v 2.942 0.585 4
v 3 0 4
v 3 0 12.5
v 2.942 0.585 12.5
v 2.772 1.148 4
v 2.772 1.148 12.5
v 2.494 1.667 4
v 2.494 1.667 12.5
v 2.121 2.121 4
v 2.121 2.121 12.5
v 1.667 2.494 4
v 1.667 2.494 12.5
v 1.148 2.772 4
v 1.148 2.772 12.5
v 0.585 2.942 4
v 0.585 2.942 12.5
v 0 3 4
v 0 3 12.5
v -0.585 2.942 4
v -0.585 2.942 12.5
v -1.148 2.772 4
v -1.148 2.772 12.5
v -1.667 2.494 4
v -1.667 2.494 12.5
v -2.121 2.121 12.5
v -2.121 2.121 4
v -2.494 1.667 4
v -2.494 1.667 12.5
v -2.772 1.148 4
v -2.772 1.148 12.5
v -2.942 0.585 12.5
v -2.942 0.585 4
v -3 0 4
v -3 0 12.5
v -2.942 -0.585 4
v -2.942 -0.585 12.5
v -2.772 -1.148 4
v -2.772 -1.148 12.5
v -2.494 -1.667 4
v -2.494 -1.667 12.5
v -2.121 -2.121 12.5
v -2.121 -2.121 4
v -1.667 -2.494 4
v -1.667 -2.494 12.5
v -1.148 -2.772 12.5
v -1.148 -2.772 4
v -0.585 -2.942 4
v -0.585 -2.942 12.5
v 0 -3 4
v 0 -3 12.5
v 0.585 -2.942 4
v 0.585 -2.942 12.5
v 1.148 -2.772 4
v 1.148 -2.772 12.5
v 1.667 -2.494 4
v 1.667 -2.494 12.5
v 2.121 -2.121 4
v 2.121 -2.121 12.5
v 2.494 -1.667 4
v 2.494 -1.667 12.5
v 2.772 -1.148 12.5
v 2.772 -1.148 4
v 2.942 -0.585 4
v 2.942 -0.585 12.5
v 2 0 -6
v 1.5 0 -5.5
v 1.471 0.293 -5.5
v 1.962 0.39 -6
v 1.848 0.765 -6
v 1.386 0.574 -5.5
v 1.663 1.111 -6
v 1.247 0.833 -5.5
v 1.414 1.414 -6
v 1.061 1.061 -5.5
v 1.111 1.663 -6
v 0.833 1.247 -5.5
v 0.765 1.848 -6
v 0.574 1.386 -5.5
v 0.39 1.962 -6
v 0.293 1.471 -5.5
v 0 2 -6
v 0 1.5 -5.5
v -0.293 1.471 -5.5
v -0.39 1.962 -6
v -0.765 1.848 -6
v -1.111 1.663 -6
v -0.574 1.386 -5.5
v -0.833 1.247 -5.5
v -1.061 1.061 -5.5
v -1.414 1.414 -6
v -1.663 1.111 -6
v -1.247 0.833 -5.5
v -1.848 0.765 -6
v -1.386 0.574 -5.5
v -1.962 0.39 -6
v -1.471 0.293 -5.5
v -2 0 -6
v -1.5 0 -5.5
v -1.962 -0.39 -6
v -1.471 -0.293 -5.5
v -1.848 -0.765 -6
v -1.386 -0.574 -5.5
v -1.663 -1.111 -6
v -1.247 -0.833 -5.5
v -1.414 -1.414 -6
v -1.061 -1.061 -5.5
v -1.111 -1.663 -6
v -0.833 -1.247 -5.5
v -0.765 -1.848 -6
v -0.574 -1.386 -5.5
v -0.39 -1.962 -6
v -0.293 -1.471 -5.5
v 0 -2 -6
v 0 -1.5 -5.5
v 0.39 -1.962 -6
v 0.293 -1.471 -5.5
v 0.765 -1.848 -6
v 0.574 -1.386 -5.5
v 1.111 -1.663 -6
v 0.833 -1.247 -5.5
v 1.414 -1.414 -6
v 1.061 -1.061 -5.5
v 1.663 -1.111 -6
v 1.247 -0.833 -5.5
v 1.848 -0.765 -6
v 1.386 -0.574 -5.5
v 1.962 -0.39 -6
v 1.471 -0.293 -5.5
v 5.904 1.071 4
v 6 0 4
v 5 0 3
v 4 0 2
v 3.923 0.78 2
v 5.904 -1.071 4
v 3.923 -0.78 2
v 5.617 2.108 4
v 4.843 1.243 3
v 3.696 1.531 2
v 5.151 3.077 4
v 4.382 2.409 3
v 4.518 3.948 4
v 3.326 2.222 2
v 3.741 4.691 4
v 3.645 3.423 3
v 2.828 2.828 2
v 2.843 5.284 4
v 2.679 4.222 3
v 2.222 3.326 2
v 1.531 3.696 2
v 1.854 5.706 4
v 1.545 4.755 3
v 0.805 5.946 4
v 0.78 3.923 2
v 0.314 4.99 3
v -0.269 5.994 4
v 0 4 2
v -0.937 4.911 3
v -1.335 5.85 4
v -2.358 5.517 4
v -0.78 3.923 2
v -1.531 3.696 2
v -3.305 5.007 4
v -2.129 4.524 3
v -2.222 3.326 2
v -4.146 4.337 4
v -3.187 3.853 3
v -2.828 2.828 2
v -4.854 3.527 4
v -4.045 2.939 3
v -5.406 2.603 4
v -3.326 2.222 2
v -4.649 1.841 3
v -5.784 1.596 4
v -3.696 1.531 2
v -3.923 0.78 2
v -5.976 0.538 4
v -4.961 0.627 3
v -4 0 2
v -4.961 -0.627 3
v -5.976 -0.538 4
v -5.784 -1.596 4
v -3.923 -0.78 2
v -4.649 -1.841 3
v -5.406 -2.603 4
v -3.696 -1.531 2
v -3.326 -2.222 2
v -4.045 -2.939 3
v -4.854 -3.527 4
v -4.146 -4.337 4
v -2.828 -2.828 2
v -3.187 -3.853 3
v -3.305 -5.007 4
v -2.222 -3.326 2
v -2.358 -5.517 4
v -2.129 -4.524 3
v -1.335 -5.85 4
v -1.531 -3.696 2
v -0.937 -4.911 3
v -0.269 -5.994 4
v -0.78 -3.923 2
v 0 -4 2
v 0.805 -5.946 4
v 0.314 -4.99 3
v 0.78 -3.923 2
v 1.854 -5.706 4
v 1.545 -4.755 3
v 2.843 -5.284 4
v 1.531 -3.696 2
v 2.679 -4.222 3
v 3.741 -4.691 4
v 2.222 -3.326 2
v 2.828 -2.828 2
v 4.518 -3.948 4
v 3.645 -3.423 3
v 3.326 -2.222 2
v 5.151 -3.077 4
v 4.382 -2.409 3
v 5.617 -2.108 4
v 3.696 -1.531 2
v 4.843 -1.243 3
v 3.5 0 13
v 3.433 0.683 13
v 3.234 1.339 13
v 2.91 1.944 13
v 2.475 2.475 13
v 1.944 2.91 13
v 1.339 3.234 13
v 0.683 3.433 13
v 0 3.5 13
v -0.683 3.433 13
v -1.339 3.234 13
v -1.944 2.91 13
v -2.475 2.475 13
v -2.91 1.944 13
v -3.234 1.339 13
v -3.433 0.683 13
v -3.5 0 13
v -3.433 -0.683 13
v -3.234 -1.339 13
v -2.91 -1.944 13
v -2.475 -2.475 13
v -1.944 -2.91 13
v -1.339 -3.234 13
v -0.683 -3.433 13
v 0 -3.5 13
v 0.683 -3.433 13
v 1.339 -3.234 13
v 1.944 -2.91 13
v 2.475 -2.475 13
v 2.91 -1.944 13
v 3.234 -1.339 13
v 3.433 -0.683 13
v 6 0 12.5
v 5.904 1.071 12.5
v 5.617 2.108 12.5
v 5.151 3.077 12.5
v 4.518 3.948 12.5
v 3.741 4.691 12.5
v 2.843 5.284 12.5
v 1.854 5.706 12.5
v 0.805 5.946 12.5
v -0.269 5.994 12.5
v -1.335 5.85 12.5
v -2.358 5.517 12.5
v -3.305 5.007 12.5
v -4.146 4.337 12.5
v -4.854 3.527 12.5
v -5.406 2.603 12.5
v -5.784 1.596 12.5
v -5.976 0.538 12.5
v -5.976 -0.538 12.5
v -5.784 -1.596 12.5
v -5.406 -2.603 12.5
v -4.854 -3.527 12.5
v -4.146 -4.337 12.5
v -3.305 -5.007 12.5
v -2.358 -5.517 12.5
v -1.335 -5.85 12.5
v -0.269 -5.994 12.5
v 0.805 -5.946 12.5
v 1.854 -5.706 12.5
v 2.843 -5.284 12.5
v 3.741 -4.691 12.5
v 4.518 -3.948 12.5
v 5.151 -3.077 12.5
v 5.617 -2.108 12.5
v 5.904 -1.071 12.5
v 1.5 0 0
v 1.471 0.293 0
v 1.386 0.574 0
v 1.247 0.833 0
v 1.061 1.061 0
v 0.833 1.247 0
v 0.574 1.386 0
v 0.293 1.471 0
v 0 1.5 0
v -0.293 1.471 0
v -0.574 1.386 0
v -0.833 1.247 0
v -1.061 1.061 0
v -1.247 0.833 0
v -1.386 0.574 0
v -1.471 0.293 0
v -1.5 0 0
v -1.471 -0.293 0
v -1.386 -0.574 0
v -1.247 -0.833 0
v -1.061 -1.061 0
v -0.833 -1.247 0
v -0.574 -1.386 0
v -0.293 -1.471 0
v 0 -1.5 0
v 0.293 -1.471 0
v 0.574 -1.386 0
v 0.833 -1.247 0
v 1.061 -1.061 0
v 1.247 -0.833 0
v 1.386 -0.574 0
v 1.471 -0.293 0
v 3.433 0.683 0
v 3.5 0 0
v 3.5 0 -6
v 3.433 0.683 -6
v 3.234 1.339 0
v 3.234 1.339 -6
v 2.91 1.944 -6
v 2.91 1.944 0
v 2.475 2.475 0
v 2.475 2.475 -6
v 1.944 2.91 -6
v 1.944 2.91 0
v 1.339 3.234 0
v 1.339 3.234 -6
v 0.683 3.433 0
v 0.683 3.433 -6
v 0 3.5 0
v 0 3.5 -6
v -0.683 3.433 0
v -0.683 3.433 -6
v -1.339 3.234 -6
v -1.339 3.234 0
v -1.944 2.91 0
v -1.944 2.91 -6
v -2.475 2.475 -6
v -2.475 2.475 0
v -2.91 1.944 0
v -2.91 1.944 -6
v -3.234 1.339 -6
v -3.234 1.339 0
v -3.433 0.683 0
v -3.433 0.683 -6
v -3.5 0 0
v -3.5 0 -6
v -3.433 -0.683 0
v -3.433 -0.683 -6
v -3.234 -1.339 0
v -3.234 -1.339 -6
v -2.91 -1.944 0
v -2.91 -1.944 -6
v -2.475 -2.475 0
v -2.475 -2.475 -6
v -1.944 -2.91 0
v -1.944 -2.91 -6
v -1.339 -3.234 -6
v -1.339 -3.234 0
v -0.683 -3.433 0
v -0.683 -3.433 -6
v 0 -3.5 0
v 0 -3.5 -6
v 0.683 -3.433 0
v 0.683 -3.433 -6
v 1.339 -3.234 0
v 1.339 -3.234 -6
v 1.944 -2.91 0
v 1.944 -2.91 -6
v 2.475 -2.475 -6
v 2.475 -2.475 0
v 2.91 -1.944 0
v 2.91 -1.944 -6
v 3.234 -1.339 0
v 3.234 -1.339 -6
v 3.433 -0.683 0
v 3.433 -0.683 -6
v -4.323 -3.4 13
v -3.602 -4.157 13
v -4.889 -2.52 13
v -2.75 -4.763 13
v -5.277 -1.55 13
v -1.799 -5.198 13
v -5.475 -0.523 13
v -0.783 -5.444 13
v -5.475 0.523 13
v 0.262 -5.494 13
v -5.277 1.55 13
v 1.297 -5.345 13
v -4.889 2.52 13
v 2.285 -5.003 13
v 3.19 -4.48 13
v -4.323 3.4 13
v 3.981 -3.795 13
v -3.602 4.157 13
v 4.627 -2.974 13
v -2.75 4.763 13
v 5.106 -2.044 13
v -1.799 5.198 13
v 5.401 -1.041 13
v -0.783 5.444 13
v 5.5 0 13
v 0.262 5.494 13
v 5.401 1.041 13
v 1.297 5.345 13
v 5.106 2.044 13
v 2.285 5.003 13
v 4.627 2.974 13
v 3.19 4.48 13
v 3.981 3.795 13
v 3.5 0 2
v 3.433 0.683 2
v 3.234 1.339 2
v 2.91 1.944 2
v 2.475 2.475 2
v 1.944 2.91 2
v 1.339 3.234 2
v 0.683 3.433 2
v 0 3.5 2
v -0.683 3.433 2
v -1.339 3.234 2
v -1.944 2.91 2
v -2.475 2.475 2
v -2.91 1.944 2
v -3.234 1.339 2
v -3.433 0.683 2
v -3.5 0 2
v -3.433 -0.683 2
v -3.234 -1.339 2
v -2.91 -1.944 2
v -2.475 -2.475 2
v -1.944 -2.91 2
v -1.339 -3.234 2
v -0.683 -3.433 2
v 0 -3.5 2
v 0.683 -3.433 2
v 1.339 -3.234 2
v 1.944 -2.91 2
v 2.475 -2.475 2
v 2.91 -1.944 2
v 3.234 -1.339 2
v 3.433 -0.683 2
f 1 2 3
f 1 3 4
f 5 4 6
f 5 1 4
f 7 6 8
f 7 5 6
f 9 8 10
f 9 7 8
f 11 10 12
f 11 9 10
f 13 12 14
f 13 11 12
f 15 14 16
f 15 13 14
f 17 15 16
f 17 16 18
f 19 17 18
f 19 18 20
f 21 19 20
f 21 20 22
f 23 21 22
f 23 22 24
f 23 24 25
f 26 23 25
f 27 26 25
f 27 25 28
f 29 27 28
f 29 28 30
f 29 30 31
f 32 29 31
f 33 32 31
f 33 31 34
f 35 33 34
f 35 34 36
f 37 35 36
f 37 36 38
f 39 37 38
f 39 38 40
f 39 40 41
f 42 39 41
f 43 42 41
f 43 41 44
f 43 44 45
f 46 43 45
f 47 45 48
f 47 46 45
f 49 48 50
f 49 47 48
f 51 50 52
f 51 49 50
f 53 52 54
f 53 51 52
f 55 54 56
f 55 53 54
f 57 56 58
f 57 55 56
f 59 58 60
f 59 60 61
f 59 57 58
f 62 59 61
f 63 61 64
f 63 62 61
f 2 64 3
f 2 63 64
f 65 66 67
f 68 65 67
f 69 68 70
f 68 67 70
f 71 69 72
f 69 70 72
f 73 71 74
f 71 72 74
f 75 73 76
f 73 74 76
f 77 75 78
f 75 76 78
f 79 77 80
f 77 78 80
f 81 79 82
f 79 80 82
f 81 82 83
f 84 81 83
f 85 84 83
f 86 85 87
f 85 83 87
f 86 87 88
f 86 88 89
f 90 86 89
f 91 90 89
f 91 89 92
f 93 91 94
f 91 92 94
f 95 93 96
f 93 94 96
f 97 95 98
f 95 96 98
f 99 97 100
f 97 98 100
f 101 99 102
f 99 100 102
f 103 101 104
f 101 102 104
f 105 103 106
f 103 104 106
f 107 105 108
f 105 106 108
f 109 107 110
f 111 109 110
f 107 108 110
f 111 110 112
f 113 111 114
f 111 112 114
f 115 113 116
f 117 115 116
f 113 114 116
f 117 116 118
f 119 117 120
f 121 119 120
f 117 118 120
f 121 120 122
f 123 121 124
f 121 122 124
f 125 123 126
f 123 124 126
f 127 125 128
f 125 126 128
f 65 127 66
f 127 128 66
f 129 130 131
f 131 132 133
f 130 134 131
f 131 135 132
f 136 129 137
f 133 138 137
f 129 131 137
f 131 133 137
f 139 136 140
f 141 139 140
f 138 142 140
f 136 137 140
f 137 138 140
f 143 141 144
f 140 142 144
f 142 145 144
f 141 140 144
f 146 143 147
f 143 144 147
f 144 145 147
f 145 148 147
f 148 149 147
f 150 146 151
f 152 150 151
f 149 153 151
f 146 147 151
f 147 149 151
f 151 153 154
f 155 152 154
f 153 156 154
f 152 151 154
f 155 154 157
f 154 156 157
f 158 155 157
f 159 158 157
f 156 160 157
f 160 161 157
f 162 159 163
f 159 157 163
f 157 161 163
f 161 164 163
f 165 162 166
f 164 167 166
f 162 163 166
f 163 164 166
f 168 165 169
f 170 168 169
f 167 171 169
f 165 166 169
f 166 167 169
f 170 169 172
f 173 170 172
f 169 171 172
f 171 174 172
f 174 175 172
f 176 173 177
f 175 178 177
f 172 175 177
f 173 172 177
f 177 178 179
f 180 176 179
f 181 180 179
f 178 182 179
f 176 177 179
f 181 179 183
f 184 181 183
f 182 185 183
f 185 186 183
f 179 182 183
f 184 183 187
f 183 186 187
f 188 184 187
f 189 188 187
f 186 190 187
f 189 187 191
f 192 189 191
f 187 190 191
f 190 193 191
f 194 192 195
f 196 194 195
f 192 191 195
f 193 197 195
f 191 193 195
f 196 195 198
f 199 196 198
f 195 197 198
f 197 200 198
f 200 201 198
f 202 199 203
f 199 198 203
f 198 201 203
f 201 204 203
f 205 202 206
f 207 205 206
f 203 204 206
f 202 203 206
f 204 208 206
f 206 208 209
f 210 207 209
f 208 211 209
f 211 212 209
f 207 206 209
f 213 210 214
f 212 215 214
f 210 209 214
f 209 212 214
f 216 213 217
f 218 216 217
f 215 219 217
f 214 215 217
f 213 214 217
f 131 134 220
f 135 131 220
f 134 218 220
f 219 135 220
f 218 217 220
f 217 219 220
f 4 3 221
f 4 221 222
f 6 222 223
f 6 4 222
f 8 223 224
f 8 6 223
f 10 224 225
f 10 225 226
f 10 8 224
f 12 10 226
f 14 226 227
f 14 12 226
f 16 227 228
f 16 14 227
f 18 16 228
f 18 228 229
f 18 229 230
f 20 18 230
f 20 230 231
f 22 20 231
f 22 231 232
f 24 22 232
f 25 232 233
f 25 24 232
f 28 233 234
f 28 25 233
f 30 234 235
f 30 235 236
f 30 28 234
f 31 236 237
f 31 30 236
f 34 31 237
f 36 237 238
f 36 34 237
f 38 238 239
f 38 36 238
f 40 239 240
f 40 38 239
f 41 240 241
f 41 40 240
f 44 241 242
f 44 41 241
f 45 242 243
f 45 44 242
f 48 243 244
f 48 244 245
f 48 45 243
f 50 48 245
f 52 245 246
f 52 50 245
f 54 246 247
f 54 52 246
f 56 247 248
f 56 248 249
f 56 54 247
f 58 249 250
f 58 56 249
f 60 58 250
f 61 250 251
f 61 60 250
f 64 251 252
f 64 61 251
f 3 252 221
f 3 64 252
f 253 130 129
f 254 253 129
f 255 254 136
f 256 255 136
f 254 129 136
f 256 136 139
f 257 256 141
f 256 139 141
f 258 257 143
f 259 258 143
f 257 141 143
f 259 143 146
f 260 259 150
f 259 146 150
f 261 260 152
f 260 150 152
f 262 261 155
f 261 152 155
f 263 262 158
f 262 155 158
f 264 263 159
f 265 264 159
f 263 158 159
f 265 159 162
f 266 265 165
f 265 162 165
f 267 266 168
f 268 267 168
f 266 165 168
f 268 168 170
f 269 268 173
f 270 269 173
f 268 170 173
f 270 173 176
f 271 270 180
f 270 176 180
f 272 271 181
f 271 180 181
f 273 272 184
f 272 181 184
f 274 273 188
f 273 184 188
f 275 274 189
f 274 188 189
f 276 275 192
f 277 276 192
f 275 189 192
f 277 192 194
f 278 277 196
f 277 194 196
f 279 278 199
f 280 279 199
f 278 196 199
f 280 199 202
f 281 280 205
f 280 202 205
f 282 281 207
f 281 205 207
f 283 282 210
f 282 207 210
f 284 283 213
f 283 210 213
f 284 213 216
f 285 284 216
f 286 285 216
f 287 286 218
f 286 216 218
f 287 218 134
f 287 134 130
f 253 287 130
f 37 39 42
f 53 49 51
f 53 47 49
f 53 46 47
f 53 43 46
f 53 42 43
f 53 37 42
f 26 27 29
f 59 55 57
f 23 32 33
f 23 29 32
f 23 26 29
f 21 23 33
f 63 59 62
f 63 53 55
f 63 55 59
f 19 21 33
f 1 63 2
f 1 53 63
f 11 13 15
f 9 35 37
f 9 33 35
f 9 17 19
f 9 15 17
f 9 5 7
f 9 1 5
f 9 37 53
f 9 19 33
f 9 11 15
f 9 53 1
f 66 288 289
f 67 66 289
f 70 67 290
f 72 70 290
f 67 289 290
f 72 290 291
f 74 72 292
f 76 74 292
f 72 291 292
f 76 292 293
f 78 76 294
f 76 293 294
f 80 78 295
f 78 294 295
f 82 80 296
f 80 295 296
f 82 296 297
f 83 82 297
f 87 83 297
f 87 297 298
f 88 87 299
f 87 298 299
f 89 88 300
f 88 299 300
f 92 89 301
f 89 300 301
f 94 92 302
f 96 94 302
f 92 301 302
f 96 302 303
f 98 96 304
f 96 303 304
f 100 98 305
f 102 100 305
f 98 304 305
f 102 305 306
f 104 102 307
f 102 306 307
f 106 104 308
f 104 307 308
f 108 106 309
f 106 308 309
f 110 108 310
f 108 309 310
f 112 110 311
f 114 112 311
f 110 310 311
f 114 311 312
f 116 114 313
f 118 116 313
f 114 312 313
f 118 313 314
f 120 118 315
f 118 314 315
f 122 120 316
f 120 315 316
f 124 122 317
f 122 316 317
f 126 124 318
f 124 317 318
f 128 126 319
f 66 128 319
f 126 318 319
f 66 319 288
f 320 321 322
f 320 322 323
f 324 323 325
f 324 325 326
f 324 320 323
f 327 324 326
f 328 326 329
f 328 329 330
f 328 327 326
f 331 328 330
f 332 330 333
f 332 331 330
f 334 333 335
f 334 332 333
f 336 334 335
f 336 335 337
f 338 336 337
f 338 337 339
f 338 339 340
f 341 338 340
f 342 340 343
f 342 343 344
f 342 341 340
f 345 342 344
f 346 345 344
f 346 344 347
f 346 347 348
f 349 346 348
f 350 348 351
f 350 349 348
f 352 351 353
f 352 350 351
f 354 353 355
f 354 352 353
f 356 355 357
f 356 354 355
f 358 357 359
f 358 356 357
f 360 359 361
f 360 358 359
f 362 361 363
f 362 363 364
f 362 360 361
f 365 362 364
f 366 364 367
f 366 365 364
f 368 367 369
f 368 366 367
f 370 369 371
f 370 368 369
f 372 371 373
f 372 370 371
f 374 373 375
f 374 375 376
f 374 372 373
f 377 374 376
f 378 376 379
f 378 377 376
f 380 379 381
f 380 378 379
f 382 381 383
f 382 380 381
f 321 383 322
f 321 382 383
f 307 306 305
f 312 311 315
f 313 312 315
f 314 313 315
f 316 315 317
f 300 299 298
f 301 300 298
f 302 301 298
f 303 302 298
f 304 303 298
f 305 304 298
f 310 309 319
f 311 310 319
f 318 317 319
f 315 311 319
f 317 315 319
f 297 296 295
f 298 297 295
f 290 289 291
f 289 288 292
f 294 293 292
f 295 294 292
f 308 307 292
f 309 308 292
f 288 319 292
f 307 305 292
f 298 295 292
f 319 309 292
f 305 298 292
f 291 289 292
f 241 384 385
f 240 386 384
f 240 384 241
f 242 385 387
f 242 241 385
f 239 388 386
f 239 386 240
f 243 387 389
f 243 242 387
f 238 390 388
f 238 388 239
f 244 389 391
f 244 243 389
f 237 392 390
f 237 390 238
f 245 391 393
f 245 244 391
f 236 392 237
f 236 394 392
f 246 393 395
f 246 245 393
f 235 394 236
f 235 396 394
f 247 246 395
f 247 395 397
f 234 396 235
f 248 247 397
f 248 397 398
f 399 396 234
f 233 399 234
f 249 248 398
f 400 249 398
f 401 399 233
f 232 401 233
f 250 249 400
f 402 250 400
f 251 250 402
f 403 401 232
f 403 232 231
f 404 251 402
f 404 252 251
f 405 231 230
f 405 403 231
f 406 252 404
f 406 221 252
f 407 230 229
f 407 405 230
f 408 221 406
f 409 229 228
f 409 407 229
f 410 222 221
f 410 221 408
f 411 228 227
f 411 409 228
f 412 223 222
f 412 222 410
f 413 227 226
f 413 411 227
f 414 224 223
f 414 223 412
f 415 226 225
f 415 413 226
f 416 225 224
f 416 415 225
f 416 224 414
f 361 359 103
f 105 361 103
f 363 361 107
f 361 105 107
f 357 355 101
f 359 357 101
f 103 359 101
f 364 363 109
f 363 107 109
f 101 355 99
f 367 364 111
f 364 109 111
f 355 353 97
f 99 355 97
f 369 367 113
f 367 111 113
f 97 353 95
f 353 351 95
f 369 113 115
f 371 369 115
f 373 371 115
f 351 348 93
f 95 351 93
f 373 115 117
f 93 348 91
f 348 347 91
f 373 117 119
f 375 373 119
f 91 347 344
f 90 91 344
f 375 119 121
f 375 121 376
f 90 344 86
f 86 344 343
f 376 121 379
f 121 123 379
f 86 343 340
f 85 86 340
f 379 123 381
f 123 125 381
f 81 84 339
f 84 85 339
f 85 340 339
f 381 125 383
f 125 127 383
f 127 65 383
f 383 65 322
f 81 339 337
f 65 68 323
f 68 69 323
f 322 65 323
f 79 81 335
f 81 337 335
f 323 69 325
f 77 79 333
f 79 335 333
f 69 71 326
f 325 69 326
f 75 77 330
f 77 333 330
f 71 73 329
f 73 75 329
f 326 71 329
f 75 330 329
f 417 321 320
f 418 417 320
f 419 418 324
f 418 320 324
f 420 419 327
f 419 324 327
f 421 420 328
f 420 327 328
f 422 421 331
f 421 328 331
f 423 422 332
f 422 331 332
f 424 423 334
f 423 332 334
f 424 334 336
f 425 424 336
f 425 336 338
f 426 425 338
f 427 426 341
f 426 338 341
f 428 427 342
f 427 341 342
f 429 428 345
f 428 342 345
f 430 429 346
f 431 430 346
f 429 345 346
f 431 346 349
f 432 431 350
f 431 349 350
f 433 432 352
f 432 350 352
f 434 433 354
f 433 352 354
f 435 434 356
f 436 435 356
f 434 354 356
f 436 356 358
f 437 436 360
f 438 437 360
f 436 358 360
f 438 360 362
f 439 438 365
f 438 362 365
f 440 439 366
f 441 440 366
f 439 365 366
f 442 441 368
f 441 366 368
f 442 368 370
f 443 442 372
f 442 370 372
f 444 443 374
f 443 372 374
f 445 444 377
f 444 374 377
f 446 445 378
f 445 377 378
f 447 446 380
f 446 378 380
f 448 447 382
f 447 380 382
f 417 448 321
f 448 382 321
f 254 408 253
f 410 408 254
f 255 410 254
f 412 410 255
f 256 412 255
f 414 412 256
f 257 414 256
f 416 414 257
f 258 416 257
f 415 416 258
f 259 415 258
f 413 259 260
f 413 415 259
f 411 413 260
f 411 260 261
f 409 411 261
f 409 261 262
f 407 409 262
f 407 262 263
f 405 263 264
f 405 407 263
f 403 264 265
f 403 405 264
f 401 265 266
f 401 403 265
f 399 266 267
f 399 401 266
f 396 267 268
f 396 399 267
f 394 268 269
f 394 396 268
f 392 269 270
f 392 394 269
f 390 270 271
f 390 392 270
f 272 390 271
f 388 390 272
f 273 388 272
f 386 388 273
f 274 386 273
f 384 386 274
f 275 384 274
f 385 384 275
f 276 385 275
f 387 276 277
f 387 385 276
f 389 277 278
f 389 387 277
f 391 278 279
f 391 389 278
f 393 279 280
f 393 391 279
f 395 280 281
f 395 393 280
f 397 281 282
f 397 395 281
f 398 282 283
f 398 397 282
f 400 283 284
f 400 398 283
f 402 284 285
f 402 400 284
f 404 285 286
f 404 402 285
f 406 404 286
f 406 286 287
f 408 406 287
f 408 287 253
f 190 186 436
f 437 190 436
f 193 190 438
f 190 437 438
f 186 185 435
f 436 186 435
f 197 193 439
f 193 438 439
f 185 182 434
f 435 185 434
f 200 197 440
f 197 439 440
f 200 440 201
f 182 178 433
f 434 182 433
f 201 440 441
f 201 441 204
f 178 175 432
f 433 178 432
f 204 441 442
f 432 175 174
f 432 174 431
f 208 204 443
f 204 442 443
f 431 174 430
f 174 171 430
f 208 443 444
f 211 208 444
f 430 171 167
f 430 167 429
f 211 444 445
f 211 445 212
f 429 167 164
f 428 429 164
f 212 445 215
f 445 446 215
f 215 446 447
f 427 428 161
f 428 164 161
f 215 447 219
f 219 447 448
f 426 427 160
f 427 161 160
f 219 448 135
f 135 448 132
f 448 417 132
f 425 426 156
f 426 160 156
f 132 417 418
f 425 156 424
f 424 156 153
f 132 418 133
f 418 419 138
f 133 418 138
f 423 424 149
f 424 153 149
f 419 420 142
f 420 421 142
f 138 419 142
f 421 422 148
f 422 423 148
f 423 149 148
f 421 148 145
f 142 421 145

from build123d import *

# Parameters (mm, degrees)
F0_R     = 3.5
F0_R_2   = 1.5
F1_DEPTH = 6
F2_R     = 3.5
F2_R_2   = 1.5
F3_DEPTH = 2
F4_R     = 3.5
F4_R_2   = 3
F5_DEPTH = 2
F4_R_3   = 6
F6_DEPTH = 11
F7_SIZE  = 0.5
F8_SIZE  = 2


with BuildPart() as f1:
    # F0 (on Top) → F1 (new body)
    with BuildSketch(Plane.XY):
        Circle(F0_R)
        Circle(F0_R_2, mode=Mode.SUBTRACT)
    extrude(amount=-F1_DEPTH)

    # F2 (on face) → F3 (join)
    with BuildSketch(Plane.XY):
        Circle(F2_R)
        Circle(F2_R_2, mode=Mode.SUBTRACT)
        Circle(F2_R_2)
    extrude(amount=F3_DEPTH)

    # F4 (on face) → F5 (join)
    with BuildSketch(Plane.XY.offset(2)):
        Circle(F4_R)
        Circle(F4_R_2, mode=Mode.SUBTRACT)
        Circle(F4_R_2)
    extrude(amount=F5_DEPTH)

    # F4 (on face) → F6 (join)
    with BuildSketch(Plane.XY.offset(2)):
        Circle(F4_R_3)
        Circle(F4_R_2, mode=Mode.SUBTRACT)
    extrude(amount=F6_DEPTH)

    # F7
    f7_edges = [f1.edges().sort_by_distance(p)[0] for p in [
        (-3, 0, 13),
        (-6, 0, 13),
        (-1.5, 0, -6),
    ]]
    chamfer(f7_edges, length=F7_SIZE)

    # F8
    f8_edges = [f1.edges().sort_by_distance(p)[0] for p in [
        (-6, 0, 2),
    ]]
    chamfer(f8_edges, length=F8_SIZE)


solid = f1.part
